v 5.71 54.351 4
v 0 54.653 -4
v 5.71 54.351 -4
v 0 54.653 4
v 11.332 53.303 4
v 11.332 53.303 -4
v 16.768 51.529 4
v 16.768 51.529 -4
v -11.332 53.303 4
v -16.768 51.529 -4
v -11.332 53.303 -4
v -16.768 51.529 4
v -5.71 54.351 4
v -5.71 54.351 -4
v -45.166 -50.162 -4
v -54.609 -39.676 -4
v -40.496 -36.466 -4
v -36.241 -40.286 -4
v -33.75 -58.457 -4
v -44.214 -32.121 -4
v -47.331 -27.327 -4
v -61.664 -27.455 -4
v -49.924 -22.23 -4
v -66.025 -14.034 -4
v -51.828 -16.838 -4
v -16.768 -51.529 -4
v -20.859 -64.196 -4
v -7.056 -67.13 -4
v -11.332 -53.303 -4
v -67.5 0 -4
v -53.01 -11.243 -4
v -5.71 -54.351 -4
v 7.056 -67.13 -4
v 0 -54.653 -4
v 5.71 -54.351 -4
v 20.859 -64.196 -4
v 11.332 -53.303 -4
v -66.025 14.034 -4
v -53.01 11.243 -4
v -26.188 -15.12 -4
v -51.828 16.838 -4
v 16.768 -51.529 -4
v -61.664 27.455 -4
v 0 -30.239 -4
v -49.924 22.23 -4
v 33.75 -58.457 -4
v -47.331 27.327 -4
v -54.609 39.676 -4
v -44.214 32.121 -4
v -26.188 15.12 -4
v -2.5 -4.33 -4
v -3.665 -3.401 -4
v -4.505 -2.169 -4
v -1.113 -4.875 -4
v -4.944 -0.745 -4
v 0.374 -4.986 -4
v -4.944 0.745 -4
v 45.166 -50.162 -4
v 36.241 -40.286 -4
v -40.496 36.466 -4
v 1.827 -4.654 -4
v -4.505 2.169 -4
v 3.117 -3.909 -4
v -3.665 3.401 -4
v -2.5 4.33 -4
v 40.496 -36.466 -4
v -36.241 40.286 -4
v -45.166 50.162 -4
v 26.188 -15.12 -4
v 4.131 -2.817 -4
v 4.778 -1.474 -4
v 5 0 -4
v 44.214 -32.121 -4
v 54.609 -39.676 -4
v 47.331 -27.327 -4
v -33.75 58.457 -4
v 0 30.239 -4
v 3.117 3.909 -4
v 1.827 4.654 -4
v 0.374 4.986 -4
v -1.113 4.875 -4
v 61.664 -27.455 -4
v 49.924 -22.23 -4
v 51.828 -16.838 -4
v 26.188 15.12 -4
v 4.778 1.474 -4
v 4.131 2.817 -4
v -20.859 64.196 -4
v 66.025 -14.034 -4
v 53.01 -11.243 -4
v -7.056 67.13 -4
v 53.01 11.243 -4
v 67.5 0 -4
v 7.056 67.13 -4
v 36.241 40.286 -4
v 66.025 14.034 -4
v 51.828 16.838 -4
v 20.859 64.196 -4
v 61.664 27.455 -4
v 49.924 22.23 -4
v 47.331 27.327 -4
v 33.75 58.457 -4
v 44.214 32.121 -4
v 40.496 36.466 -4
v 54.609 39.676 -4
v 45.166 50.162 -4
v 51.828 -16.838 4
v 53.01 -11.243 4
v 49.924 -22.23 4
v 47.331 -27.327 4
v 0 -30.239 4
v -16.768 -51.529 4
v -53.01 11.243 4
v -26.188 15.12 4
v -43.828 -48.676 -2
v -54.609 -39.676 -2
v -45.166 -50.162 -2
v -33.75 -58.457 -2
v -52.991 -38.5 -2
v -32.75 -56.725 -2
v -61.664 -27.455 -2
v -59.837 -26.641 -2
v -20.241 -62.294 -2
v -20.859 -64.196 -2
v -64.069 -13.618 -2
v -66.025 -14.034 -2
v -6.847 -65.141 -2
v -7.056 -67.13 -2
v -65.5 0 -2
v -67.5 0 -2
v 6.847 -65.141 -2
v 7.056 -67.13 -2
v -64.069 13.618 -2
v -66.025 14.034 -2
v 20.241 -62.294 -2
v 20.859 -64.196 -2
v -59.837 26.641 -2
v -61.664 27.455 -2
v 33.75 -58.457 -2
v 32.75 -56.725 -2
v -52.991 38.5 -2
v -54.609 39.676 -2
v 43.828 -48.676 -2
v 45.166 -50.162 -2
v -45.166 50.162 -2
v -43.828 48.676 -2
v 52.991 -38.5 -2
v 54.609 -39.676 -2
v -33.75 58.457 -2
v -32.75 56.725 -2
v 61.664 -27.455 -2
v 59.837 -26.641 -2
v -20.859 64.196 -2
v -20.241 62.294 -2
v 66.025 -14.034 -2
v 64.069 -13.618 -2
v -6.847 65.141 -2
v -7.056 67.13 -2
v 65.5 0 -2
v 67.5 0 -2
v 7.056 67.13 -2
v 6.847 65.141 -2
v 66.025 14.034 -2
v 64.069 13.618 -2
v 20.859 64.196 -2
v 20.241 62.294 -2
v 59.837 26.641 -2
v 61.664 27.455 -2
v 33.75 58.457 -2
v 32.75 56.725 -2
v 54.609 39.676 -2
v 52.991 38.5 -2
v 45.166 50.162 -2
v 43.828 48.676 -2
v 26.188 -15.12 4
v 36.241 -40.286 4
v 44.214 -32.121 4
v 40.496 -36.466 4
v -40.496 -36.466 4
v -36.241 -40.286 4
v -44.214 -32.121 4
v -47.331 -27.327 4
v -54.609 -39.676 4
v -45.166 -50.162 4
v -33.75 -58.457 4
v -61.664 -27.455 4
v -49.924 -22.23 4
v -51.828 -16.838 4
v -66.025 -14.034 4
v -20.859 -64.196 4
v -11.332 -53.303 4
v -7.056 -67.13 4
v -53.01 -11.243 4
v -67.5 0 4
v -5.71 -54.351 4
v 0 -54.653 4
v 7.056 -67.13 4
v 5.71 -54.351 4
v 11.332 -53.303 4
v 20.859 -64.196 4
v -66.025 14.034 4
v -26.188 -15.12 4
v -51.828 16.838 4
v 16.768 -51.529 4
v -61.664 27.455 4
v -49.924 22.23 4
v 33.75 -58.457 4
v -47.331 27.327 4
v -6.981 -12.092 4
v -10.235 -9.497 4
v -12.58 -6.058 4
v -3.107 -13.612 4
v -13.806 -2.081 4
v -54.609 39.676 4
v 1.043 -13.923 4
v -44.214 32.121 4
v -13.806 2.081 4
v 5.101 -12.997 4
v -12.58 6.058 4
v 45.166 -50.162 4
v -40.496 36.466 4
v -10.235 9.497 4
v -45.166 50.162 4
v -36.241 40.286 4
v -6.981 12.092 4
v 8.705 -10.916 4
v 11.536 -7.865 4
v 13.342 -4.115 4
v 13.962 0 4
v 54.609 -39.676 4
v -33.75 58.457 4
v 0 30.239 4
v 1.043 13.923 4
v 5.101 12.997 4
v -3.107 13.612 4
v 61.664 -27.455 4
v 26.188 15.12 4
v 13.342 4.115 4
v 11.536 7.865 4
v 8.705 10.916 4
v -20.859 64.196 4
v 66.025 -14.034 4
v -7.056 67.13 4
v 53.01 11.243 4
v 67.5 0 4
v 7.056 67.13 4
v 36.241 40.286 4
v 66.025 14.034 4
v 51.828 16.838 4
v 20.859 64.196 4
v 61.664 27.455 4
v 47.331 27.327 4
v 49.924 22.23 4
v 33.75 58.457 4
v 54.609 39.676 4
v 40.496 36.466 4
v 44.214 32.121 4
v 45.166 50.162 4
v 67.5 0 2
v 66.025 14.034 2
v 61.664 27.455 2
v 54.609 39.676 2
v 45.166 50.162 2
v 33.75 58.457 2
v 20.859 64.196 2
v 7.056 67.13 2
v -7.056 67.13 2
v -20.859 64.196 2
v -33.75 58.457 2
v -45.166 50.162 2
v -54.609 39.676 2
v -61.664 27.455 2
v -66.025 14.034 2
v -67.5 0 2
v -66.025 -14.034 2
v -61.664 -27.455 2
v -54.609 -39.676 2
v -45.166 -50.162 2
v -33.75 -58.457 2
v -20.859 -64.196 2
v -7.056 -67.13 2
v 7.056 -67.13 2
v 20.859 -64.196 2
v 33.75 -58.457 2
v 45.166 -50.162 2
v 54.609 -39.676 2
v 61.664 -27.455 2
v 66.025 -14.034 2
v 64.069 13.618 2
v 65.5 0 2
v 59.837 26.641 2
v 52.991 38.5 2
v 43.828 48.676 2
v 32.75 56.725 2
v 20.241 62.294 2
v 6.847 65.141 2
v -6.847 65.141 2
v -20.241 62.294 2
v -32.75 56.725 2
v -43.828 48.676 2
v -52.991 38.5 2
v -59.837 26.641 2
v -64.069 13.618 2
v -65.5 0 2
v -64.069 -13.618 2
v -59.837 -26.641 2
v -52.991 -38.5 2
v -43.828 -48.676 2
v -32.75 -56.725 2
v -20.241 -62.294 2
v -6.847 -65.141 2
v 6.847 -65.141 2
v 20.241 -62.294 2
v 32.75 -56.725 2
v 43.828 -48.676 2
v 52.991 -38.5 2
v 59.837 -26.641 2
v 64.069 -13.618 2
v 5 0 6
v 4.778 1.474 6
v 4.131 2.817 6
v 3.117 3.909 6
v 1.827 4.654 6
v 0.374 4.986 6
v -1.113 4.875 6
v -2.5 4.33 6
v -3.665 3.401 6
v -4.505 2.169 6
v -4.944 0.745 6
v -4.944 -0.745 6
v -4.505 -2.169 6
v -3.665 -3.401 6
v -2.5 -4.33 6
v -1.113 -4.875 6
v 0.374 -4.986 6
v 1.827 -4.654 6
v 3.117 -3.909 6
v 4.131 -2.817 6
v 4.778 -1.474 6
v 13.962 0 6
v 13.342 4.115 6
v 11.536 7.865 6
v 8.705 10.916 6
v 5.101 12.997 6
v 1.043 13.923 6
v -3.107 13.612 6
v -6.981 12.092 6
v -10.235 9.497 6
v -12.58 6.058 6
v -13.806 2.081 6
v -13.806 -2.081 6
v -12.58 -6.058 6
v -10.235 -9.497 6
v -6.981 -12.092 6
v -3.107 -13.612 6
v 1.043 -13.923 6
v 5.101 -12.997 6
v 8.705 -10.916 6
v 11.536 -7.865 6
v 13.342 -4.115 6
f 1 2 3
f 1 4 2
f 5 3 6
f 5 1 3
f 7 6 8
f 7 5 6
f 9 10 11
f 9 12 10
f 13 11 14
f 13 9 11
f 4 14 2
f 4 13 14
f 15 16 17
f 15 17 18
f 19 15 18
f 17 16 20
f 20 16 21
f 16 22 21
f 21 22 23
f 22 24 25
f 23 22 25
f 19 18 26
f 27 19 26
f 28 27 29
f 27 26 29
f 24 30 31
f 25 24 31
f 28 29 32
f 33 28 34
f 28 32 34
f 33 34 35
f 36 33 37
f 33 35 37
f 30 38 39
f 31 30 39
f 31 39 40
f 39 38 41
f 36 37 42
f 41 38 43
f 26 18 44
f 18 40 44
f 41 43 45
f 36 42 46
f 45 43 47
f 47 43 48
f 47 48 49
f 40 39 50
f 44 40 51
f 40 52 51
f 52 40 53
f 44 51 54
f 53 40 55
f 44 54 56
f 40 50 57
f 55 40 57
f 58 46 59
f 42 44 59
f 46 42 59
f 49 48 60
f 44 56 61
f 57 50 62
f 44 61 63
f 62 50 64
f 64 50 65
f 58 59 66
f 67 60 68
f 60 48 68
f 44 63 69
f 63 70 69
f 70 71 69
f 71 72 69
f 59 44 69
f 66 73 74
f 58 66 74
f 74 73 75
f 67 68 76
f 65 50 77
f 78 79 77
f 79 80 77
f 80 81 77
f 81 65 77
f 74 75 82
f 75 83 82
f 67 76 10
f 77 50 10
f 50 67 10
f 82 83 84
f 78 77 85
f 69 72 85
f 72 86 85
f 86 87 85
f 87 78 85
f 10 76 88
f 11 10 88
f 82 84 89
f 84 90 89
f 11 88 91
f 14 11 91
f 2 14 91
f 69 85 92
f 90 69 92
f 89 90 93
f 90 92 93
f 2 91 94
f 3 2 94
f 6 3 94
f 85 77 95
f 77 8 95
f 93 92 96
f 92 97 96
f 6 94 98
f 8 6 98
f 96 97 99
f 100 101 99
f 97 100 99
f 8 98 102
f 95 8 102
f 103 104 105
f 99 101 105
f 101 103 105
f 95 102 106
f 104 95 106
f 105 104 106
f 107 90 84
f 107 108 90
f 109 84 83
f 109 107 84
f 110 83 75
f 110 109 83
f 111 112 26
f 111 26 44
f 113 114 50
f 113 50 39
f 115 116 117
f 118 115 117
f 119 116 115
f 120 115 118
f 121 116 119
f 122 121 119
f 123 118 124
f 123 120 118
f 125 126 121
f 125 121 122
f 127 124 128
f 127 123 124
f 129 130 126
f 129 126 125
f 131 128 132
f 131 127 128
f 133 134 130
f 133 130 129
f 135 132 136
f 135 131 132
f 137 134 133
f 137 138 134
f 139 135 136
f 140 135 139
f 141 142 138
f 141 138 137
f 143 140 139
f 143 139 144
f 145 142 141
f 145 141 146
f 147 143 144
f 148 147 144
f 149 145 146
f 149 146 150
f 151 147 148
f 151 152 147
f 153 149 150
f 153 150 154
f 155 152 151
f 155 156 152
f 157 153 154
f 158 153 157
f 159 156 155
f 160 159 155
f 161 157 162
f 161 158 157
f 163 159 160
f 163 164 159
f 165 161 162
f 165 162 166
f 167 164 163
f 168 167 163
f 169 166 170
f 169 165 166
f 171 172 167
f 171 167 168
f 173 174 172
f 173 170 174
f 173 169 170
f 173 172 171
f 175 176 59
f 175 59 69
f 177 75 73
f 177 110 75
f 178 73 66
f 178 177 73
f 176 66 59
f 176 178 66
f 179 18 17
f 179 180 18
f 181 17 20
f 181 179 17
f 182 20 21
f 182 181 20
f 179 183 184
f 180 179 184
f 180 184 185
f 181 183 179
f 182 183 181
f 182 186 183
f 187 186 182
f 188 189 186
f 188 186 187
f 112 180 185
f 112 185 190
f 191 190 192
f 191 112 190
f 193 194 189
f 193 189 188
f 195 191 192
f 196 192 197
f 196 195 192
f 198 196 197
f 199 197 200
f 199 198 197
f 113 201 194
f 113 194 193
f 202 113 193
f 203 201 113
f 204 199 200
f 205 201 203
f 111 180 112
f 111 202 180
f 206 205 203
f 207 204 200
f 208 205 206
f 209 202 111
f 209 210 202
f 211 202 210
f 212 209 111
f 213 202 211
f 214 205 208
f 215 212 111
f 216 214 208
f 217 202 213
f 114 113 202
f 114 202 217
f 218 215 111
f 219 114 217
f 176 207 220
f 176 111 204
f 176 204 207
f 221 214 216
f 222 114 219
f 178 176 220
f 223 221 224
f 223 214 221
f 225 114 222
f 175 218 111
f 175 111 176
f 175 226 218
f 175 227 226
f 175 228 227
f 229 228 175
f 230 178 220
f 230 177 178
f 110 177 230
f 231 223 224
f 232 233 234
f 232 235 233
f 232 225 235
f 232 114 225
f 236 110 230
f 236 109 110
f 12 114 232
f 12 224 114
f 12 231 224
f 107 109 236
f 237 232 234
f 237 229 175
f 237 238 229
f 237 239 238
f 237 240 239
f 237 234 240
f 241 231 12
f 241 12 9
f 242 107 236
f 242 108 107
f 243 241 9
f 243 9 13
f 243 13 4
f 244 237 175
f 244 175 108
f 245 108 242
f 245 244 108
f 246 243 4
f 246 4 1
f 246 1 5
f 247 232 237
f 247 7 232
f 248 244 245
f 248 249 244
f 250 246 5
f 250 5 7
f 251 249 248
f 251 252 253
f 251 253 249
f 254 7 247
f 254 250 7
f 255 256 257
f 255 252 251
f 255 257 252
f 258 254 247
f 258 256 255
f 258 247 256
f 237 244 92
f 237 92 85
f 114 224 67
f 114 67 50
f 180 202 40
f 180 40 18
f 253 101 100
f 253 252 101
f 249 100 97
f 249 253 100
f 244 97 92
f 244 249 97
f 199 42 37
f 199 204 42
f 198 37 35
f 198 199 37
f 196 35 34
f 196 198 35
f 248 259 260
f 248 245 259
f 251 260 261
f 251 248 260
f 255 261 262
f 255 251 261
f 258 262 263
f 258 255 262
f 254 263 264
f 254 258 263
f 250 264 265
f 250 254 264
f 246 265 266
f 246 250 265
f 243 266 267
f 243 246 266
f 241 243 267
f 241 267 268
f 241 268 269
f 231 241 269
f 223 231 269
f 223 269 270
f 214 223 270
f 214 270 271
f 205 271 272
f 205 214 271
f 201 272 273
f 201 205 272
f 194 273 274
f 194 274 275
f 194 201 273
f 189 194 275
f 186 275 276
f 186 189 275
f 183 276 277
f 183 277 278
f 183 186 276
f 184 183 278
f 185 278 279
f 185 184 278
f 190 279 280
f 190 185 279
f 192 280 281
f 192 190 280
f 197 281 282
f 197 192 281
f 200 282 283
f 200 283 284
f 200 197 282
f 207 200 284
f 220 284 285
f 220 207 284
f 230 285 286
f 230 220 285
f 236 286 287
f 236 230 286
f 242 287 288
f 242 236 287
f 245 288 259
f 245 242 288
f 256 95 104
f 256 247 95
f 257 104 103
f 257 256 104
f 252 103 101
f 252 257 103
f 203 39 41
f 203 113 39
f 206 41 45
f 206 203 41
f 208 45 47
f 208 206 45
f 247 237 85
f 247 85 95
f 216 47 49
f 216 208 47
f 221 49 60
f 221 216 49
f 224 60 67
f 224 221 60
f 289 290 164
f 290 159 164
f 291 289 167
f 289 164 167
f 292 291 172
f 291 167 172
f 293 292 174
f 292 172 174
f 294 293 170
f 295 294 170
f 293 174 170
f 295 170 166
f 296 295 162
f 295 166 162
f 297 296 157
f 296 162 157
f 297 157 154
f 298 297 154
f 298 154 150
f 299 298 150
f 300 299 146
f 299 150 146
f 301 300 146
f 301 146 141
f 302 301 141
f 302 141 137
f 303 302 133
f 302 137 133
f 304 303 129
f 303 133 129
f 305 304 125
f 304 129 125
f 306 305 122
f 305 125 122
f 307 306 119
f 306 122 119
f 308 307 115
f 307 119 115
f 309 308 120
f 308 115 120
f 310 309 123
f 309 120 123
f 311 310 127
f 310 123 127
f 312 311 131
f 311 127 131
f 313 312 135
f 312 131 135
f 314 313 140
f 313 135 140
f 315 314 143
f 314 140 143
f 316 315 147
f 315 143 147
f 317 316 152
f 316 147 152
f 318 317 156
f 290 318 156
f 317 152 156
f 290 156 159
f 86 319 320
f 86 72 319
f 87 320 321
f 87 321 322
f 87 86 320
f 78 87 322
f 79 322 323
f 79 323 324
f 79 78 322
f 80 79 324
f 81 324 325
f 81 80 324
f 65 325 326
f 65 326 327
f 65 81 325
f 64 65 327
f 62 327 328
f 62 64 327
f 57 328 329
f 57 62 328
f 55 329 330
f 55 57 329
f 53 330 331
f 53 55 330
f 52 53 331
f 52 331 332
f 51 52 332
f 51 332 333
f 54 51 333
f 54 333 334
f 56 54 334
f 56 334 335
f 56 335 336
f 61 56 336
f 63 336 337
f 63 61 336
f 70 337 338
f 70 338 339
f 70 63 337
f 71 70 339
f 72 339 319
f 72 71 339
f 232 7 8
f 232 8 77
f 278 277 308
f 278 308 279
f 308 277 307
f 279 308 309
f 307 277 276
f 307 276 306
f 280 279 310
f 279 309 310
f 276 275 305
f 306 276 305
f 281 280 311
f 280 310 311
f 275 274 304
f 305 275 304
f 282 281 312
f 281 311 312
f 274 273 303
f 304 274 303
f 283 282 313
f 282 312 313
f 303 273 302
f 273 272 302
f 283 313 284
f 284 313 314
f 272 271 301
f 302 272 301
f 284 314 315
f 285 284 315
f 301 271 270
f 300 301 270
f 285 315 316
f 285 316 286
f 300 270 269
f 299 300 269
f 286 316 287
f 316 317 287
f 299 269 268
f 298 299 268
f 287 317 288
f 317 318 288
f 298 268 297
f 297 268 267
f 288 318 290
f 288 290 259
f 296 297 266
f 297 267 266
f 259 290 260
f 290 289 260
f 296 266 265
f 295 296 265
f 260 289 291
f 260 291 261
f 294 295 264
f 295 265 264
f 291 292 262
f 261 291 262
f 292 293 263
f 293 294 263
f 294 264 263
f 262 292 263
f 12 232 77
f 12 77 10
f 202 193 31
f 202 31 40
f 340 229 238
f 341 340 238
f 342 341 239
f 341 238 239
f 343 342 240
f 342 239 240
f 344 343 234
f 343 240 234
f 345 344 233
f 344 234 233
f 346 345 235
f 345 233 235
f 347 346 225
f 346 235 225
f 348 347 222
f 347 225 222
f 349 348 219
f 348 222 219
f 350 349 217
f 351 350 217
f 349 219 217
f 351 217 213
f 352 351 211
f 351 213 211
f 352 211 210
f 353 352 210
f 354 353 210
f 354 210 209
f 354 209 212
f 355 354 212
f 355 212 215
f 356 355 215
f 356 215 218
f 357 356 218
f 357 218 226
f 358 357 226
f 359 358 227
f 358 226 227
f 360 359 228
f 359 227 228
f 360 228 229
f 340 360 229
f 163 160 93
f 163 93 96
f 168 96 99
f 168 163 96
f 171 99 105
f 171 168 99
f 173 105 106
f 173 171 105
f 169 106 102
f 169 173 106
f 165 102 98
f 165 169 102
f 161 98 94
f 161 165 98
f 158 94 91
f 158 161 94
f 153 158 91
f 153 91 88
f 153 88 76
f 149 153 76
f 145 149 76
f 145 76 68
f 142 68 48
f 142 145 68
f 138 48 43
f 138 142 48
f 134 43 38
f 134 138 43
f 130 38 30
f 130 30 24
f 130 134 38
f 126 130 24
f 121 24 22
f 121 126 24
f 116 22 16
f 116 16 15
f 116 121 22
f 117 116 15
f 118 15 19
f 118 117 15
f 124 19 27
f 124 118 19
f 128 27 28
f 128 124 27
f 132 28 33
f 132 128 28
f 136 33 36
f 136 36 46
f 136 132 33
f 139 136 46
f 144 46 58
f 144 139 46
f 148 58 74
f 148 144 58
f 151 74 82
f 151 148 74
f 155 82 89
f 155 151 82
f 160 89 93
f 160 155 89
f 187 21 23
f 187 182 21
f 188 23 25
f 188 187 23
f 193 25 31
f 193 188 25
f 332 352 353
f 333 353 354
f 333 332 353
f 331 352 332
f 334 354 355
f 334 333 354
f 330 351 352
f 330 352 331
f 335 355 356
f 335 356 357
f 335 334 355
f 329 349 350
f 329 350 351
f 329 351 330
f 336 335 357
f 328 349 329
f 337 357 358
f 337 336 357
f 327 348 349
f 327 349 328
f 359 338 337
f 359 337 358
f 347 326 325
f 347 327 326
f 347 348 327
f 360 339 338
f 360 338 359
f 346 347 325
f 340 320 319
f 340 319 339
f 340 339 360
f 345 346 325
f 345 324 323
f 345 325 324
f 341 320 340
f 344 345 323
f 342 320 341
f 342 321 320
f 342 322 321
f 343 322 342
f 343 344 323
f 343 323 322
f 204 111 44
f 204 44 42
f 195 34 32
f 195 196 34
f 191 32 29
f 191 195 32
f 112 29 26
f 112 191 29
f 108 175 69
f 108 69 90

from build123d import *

# Parameters (mm, degrees)
SKETCH1_R           = 67.5
SKETCH1_R_2         = 5
BOSS_EXTRUDE1_DEPTH = 4
CUT_EXTRUDE1_DEPTH  = 4
CIRPATTERN1_COUNT   = 6
SKETCH3_R           = 67.5
SKETCH3_R_2         = 65.5
CUT_EXTRUDE2_DEPTH  = 2
SKETCH4_R           = 13.962380749
SKETCH4_R_2         = 5
BOSS_EXTRUDE2_DEPTH = 2


with BuildPart() as part:
    # Sketch1 → Boss-Extrude1 (new, symmetric)
    with BuildSketch(Plane.XY):
        Circle(SKETCH1_R)
        Circle(SKETCH1_R_2, mode=Mode.SUBTRACT)
    extrude(amount=BOSS_EXTRUDE1_DEPTH, both=True)

    # Sketch2 → Cut-Extrude1 (cut, symmetric)
    with BuildSketch(Plane.XY):
        with BuildLine():
            Line((0, 30.239217172), (-16.768164039, 51.529133311))
            ThreePointArc((-16.768164039, 51.529133311), (-8.53840593, 53.919450475), (0, 54.653043584))
            ThreePointArc((0, 54.653043584), (8.53840593, 53.919450475), (16.768164039, 51.529133311))
            Line((16.768164039, 51.529133311), (0, 30.239217172))
        make_face()
    cut_extrude1 = extrude(amount=CUT_EXTRUDE1_DEPTH, both=True, mode=Mode.SUBTRACT)

    # CirPattern1: Cut-Extrude1 ×6 about axis
    cirpattern1_axis = Axis((0, 0, 0), (0, 0, 1))
    for i in range(1, CIRPATTERN1_COUNT):
        add(cut_extrude1.rotate(cirpattern1_axis, i * 360 / CIRPATTERN1_COUNT), mode=Mode.SUBTRACT)

    # Sketch3 → Cut-Extrude2 (cut, symmetric)
    with BuildSketch(Plane.XY):
        Circle(SKETCH3_R)
        Circle(SKETCH3_R_2, mode=Mode.SUBTRACT)
    extrude(amount=CUT_EXTRUDE2_DEPTH, both=True, mode=Mode.SUBTRACT)

    # Sketch4 → Boss-Extrude2 (add)
    with BuildSketch(Plane.XY.offset(4)):
        Circle(SKETCH4_R)
        Circle(SKETCH4_R_2, mode=Mode.SUBTRACT)
    extrude(amount=BOSS_EXTRUDE2_DEPTH)


solid = part.part
